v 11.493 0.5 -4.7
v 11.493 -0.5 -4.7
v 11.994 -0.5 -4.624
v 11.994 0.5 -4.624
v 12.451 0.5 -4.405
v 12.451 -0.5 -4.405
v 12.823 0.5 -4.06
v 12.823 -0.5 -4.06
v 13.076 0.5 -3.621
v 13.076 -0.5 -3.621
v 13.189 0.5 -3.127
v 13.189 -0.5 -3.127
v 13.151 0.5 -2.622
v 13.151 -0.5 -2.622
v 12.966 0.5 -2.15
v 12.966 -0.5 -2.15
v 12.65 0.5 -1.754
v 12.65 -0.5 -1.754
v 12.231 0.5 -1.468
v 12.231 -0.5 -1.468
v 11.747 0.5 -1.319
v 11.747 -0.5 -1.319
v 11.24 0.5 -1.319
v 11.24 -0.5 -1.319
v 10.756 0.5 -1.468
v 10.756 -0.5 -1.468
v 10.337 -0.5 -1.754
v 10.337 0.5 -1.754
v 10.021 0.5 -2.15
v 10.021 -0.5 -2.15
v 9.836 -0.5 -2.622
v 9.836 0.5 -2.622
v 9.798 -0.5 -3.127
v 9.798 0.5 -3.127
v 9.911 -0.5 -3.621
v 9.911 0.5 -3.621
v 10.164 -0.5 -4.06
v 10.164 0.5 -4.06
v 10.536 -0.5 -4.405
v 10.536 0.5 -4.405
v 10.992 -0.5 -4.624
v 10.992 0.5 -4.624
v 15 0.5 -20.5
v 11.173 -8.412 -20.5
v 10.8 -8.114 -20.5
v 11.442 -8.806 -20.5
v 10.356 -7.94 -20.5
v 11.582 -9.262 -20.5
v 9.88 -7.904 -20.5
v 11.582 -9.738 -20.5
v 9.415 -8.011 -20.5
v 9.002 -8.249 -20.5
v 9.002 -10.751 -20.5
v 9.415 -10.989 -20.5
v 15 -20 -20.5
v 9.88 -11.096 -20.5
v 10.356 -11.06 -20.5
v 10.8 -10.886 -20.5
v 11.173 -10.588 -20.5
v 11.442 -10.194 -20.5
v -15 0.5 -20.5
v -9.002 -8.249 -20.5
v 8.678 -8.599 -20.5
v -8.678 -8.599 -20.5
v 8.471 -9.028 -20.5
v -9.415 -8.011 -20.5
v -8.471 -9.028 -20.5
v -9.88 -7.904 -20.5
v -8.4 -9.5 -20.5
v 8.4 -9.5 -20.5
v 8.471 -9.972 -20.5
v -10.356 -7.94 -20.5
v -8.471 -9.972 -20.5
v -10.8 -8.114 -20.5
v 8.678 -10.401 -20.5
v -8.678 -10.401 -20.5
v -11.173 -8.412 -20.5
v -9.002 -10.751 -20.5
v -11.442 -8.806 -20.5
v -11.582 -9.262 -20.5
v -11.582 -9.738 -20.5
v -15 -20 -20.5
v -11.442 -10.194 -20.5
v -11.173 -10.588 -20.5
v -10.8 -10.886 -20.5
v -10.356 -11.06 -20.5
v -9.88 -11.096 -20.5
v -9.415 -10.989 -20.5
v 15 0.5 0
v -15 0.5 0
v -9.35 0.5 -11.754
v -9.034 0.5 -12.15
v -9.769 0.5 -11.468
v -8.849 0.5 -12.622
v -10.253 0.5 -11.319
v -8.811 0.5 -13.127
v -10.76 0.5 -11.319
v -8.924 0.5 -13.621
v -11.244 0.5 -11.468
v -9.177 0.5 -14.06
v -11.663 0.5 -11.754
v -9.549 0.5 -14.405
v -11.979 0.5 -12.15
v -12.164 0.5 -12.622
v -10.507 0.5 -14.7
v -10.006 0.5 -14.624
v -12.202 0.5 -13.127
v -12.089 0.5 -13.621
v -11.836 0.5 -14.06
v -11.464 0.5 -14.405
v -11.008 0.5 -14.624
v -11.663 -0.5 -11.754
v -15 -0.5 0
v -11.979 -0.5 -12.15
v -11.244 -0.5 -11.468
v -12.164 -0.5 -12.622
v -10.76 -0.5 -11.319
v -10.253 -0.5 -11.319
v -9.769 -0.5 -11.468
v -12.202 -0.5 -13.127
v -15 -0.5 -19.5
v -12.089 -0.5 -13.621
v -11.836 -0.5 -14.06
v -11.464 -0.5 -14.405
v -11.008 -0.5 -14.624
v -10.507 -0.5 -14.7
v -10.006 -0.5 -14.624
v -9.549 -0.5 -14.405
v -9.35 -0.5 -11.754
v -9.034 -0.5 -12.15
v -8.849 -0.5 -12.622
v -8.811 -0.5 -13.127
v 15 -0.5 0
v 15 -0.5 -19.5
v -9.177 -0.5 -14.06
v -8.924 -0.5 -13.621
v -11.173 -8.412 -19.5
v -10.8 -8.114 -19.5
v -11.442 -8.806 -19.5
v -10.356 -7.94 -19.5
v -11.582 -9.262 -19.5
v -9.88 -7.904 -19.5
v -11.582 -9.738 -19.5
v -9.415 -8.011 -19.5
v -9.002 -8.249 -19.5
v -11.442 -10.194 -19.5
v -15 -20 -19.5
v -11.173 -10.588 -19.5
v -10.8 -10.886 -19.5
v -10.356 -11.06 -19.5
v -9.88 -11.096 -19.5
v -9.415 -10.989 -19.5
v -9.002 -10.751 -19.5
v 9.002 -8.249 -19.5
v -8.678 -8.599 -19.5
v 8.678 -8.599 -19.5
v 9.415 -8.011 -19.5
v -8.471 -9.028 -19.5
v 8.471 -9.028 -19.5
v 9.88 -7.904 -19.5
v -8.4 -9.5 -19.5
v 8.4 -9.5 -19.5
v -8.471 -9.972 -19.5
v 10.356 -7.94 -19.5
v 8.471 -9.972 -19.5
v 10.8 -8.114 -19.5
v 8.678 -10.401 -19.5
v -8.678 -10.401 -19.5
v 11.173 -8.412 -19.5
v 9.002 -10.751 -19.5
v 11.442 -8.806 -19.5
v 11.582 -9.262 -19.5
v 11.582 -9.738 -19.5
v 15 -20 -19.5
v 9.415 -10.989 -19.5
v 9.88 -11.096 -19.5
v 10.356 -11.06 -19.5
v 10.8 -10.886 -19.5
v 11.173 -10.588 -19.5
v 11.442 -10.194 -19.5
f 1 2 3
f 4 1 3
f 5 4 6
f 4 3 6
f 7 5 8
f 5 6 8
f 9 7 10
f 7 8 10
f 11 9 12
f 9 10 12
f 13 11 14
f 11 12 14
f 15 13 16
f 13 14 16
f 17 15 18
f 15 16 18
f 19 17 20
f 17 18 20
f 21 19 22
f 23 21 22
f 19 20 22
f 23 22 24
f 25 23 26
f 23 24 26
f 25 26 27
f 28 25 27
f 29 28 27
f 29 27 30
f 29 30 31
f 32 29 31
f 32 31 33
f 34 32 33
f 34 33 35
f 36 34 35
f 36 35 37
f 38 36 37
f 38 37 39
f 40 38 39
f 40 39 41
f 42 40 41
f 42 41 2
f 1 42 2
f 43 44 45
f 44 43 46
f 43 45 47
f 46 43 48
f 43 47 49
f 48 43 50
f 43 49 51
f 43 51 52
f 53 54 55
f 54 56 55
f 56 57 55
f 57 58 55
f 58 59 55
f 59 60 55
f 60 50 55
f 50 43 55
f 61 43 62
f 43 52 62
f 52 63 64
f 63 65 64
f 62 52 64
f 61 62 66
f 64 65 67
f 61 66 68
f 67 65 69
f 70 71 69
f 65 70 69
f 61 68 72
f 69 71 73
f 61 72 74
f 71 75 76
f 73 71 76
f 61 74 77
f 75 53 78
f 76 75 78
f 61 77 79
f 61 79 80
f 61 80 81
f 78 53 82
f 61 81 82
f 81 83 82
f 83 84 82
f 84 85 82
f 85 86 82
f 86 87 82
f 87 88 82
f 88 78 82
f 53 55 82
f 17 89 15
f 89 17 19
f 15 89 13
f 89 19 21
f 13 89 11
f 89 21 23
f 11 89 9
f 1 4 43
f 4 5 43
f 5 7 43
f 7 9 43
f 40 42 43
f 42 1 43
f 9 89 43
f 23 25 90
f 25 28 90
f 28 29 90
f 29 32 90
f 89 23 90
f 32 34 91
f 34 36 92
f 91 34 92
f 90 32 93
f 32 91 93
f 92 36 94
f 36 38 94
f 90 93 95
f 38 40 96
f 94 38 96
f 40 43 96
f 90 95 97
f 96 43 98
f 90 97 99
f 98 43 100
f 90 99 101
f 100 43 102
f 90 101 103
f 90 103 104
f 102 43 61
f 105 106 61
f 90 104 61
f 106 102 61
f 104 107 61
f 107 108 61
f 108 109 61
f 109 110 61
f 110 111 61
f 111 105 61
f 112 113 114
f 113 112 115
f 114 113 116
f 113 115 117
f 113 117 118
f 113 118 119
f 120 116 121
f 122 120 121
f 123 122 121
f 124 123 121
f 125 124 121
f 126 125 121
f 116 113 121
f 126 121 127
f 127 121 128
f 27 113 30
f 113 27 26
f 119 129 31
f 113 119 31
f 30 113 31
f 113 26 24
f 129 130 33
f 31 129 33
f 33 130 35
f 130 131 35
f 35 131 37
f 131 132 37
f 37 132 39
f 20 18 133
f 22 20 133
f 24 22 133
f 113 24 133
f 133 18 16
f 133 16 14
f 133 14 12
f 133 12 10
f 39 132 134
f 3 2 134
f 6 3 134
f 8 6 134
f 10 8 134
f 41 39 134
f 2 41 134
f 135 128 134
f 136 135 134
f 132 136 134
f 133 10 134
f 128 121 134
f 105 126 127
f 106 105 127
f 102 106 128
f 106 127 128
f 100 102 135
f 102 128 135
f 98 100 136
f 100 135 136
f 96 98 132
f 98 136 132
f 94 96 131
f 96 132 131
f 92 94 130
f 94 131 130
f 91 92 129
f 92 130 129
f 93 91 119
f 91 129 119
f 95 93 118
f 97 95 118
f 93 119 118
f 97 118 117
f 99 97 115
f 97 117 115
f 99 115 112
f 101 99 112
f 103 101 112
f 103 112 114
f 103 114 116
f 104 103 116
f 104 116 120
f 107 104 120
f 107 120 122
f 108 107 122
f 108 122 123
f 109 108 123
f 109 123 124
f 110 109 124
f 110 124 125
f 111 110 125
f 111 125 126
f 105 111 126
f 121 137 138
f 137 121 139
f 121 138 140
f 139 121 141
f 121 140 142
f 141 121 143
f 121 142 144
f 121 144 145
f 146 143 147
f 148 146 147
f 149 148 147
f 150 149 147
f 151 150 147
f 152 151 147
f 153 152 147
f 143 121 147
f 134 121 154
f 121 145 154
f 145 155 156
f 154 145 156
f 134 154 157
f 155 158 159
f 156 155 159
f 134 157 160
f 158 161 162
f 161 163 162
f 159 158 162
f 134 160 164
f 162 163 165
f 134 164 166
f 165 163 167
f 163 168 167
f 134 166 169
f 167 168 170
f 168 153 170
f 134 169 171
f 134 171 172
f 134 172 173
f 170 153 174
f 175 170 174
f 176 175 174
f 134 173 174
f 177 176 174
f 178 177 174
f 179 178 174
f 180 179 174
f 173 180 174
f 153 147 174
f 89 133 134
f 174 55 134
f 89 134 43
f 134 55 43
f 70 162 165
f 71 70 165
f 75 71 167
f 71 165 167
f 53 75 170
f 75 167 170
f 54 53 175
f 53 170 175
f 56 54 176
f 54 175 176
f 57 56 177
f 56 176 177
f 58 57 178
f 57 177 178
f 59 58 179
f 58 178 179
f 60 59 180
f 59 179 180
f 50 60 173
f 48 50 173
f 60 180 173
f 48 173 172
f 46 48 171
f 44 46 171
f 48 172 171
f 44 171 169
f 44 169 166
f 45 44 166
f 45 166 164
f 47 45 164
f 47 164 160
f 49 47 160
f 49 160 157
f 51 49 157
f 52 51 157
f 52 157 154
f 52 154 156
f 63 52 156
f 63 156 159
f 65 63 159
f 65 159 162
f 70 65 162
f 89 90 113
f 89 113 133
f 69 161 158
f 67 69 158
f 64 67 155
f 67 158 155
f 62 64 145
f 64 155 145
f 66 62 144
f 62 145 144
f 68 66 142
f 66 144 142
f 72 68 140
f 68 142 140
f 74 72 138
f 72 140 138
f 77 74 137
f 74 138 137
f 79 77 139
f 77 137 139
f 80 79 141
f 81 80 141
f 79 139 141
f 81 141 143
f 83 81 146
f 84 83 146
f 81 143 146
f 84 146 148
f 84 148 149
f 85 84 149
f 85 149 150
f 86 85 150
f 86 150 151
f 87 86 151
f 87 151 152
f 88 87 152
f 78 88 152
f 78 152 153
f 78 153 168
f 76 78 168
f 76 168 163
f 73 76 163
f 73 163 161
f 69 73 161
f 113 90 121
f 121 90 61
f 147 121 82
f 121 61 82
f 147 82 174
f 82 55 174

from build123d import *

# Parameters (mm, degrees)
ESQUISSE1_W             = 30
ESQUISSE1_H             = 1
ESQUISSE7_R             = 1.7
ENL_V_MAT_EXTRU_1_DEPTH = 33.023428923
ESQUISSE8_R             = 1.6
ENL_V_MAT_EXTRU_2_DEPTH = 32.705677725


with BuildPart() as part:
    # Balayage1: sweep along a path in Esquisse6
    with BuildLine(Plane(origin=(0, 0, 0), x_dir=(0, 0, -1), z_dir=(1, 0, 0))) as balayage1_path:
        Line((0, 0), (20, 0))
        Line((20, 0), (20, -20))
    # Esquisse1 → Balayage1 (sweep)
    with BuildSketch(Plane.XY):
        Rectangle(ESQUISSE1_W, ESQUISSE1_H)
    sweep(path=balayage1_path.line, transition=Transition.RIGHT)

    # Esquisse7 → Enlèv. mat.-Extru.1 (cut, through all)
    with BuildSketch(Plane.XZ.offset(0.5)):
        with Locations(Location((11.49340839, -3, 0), (0, 0, 270))):
            Circle(ESQUISSE7_R)
        with Locations(Location((-10.50659161, -13, 0), (0, 0, 270))):
            Circle(ESQUISSE7_R)
    extrude(amount=-ENL_V_MAT_EXTRU_1_DEPTH, mode=Mode.SUBTRACT)

    # Esquisse8 → Enlèv. mat.-Extru.2 (cut, through all)
    with BuildSketch(Plane.XY.offset(-19.5)):
        with Locations((-10, -9.5)):
            Circle(ESQUISSE8_R)
        with Locations(Location((10, -9.5, 0), (0, 0, 180))):
            Circle(ESQUISSE8_R)
    extrude(amount=-ENL_V_MAT_EXTRU_2_DEPTH, mode=Mode.SUBTRACT)


solid = part.part
